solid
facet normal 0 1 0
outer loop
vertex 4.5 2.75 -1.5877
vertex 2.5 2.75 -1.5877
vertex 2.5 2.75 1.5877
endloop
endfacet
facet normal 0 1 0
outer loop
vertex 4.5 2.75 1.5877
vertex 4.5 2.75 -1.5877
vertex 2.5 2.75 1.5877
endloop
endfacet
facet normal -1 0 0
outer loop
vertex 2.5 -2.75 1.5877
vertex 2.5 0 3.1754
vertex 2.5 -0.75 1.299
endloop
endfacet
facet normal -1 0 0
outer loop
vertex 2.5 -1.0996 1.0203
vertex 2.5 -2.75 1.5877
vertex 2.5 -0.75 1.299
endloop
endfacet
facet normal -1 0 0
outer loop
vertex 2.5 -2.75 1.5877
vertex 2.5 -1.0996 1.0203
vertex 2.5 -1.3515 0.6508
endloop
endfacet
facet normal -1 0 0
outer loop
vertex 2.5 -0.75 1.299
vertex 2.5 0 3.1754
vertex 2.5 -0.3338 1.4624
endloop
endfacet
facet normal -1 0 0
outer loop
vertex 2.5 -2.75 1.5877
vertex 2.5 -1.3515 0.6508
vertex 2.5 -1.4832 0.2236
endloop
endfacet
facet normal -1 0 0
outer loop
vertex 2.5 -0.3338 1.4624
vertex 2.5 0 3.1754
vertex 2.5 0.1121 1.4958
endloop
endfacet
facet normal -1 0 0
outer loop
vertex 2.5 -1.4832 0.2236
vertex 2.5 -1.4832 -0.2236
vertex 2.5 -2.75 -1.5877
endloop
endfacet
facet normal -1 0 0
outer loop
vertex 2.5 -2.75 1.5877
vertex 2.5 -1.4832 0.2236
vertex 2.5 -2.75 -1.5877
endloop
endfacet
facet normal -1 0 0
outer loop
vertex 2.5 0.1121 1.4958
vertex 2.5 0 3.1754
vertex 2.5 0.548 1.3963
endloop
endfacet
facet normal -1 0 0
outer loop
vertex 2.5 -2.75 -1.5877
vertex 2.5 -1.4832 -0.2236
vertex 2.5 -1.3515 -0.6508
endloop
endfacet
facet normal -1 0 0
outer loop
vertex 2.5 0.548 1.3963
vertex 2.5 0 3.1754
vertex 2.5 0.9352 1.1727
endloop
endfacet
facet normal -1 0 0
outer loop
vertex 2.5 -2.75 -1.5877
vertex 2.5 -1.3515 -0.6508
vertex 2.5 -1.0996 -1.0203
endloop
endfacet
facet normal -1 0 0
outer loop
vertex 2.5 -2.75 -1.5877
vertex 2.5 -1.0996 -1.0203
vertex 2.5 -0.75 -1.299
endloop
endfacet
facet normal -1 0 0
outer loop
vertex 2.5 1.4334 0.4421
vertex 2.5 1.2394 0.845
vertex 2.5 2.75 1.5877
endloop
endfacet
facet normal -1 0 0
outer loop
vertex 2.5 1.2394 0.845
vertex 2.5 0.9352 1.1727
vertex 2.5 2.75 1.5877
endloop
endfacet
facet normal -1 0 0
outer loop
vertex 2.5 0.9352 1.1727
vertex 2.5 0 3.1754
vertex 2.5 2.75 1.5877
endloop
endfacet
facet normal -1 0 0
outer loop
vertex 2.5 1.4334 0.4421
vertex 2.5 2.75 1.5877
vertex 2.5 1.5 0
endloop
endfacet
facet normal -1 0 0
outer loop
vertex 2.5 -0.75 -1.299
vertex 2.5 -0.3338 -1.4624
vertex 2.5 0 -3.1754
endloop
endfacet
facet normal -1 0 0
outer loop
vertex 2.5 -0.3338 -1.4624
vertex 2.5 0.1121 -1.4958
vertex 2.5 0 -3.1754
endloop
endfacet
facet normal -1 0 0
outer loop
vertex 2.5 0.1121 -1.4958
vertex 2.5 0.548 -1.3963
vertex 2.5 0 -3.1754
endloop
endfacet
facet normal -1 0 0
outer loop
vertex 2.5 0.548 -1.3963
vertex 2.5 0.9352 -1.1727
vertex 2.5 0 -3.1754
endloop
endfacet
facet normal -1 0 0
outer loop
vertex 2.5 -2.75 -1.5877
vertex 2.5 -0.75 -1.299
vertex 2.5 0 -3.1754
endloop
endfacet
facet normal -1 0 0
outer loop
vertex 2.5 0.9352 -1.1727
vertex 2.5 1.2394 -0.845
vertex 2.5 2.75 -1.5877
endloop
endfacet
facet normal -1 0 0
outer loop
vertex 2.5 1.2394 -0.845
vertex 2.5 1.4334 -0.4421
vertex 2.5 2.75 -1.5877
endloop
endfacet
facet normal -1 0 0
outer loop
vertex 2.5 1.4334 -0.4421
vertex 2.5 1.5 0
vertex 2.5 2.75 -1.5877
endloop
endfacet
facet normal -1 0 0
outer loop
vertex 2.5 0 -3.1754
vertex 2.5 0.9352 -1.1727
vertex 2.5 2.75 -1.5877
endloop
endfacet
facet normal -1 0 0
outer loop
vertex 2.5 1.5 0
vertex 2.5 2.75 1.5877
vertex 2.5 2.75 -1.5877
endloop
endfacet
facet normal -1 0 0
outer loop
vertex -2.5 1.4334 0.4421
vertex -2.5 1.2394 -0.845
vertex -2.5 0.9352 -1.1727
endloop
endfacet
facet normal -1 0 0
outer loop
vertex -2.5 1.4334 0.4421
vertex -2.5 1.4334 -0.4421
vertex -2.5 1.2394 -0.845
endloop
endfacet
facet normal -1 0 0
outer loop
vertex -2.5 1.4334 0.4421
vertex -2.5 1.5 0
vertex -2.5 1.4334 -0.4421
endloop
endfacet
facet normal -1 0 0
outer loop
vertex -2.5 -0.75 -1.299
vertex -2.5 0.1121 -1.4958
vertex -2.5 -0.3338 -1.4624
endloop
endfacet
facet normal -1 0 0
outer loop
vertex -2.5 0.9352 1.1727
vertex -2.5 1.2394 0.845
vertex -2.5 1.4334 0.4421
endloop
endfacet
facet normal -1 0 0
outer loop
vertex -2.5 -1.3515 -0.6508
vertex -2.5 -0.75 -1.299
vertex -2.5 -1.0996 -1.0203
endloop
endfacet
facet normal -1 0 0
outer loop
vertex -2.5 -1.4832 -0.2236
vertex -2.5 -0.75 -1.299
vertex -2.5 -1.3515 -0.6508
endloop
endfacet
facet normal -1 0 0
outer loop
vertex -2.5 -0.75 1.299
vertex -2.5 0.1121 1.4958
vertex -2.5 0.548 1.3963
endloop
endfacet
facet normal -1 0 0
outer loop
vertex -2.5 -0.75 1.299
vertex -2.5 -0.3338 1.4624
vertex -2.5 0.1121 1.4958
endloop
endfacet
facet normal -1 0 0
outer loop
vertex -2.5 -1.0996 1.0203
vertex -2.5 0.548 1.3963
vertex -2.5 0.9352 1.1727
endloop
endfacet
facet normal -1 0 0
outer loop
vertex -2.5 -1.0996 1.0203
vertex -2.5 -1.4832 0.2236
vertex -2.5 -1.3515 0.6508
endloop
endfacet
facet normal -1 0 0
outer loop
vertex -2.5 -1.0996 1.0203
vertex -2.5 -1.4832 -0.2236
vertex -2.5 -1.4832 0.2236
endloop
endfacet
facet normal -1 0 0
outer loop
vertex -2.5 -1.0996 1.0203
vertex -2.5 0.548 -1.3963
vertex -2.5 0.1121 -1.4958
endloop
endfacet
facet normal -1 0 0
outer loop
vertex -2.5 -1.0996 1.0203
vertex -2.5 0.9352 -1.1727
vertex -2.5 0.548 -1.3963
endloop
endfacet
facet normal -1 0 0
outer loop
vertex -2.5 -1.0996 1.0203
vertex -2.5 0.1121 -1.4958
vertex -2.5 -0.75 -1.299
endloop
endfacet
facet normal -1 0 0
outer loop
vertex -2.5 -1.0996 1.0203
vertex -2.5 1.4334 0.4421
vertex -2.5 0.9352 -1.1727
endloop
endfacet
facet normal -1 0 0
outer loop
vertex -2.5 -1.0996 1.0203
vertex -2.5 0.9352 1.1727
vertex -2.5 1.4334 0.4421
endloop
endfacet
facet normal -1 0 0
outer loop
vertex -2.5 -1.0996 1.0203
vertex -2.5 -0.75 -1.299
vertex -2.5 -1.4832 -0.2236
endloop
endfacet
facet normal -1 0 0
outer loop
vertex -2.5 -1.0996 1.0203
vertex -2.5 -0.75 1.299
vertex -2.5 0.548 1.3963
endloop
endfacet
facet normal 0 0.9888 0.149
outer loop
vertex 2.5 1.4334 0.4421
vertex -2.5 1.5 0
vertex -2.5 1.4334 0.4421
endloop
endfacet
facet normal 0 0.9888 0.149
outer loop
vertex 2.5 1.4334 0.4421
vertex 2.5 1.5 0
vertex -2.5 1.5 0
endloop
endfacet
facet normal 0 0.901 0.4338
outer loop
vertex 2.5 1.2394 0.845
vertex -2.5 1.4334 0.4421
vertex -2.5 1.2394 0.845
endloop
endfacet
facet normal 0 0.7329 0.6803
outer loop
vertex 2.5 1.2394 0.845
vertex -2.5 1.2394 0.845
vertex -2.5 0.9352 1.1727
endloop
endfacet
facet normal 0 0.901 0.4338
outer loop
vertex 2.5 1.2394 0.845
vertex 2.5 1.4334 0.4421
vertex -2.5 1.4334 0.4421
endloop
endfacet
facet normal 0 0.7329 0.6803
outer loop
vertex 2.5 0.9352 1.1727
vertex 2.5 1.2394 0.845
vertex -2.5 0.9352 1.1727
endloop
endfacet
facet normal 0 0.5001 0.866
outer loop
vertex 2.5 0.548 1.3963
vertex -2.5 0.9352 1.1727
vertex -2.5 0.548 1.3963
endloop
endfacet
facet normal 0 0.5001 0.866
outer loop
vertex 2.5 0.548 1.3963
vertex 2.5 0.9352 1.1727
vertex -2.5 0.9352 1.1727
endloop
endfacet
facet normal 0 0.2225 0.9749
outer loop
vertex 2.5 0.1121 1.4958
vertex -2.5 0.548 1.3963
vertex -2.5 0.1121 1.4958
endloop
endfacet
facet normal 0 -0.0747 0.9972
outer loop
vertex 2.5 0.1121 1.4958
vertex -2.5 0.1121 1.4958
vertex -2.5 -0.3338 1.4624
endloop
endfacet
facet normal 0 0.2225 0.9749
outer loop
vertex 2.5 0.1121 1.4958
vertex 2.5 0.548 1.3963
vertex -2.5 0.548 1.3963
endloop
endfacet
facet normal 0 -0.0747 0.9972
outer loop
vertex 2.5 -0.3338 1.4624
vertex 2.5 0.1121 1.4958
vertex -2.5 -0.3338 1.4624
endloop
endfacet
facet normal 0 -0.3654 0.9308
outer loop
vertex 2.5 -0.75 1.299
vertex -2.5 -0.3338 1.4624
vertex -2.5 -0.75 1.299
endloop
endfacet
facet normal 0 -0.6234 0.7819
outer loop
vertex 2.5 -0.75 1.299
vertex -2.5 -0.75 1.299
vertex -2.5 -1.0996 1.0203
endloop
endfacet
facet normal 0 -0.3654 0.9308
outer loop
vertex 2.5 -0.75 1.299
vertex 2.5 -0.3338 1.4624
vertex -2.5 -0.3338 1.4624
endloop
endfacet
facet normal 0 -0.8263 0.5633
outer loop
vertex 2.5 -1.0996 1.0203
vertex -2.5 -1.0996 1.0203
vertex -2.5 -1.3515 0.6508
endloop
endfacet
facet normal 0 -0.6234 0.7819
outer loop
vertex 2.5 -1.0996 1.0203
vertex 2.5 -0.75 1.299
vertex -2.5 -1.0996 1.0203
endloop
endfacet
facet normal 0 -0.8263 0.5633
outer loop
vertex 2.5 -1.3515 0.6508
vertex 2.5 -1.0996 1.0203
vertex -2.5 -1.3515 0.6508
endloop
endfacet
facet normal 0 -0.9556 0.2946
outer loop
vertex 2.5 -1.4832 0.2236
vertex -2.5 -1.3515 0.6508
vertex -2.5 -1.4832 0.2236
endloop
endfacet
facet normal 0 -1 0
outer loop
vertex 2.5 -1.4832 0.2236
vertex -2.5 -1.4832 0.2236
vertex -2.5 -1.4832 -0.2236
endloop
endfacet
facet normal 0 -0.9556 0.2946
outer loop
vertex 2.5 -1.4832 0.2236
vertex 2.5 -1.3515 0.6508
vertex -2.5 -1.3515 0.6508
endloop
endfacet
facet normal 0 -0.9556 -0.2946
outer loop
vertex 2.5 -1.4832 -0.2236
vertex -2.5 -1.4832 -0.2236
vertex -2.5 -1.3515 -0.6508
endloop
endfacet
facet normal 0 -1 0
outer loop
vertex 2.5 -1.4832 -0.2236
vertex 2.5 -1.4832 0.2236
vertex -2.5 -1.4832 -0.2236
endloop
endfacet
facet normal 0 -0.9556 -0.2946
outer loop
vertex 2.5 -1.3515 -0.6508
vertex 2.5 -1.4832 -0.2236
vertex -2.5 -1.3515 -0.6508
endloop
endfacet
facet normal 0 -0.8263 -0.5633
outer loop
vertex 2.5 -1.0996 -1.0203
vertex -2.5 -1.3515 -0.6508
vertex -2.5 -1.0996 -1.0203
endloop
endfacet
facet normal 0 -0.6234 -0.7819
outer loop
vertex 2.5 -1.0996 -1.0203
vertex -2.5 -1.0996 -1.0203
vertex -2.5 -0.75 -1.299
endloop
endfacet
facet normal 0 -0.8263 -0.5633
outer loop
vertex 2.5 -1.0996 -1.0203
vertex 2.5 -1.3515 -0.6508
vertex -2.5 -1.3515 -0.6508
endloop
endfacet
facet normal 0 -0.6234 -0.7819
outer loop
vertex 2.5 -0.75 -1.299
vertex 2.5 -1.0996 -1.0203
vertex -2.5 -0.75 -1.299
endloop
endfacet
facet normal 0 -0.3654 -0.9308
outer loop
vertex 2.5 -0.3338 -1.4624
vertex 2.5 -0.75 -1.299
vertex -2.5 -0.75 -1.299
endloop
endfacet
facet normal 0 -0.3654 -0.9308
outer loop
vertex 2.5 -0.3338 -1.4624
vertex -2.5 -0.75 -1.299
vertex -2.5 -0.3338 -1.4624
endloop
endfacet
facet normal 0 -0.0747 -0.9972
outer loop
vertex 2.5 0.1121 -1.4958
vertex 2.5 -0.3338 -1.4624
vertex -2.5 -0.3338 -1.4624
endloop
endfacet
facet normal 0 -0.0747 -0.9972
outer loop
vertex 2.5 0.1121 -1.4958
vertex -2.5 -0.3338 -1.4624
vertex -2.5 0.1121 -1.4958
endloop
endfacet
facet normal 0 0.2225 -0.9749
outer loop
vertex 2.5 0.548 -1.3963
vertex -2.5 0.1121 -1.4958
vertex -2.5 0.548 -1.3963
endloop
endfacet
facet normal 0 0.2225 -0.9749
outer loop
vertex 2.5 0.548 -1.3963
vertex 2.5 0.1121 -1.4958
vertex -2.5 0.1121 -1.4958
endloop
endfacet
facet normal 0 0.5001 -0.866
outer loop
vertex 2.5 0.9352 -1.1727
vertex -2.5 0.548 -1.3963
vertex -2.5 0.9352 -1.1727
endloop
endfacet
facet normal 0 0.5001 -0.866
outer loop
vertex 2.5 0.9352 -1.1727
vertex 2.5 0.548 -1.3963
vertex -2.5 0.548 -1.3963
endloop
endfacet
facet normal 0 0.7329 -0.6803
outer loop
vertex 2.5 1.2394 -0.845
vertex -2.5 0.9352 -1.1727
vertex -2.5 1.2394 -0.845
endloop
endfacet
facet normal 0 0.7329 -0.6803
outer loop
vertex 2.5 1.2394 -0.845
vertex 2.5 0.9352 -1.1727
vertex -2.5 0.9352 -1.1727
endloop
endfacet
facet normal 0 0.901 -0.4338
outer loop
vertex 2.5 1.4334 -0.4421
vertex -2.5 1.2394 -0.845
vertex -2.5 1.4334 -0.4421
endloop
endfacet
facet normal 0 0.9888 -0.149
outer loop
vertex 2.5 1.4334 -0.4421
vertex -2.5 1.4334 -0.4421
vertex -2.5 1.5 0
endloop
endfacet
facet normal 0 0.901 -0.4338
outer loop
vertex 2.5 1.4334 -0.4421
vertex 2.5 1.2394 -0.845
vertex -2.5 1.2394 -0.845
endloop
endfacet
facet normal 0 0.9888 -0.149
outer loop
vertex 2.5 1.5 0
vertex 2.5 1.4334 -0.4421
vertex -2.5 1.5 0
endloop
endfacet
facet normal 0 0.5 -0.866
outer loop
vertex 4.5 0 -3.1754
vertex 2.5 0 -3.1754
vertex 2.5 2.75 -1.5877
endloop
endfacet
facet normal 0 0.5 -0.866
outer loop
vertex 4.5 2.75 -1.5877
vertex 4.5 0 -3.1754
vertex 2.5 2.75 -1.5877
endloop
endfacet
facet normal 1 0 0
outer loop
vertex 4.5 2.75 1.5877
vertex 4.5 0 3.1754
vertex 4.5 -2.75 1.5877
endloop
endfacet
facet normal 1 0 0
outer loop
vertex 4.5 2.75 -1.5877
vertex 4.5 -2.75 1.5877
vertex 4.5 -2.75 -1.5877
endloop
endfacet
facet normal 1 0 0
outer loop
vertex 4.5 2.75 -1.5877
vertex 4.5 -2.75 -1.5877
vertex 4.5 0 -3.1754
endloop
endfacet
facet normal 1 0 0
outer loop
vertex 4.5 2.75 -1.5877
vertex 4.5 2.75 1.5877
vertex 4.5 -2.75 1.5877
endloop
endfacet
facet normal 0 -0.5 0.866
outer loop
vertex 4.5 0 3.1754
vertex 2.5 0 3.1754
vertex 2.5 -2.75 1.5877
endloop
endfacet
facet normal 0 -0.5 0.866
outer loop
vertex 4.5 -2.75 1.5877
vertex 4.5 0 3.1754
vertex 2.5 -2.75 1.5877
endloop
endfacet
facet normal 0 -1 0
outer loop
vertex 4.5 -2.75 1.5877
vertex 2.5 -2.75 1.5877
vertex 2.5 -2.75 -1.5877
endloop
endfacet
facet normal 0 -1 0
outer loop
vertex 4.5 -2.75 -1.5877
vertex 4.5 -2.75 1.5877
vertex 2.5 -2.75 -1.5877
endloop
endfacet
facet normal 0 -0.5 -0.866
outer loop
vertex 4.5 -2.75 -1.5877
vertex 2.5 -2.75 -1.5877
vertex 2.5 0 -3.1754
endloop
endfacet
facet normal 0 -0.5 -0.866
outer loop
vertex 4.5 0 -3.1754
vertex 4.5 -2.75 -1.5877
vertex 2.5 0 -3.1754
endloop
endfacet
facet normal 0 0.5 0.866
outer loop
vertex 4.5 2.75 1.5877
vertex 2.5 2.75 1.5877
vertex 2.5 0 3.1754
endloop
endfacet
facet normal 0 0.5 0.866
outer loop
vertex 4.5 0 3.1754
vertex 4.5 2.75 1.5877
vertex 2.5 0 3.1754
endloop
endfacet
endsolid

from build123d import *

# Parameters (mm, degrees)
SKETCH1_W           = 5
SKETCH1_H           = 1.5
BOSS_EXTRUDE1_DEPTH = 2


with BuildPart() as part:
    # Sketch1 → Revolve1 (revolve)
    with BuildSketch(Plane.XY):
        with Locations((0, 0.75)):
            Rectangle(SKETCH1_W, SKETCH1_H)
    revolve(axis=Axis((-16.166606446, 0, 0), (1, 0, 0)))

    # Sketch2 → Boss-Extrude1 (add)
    with BuildSketch(Plane(origin=(2.5, 0, 0), x_dir=(0, 0, -1), z_dir=(1, 0, 0))):
        Polygon((1.58771324, 2.75), (-1.58771324, 2.75), (-3.175426481, 0), (-1.58771324, -2.75), (1.58771324, -2.75), (3.175426481, 0), align=None)
    extrude(amount=BOSS_EXTRUDE1_DEPTH)


solid = part.part
